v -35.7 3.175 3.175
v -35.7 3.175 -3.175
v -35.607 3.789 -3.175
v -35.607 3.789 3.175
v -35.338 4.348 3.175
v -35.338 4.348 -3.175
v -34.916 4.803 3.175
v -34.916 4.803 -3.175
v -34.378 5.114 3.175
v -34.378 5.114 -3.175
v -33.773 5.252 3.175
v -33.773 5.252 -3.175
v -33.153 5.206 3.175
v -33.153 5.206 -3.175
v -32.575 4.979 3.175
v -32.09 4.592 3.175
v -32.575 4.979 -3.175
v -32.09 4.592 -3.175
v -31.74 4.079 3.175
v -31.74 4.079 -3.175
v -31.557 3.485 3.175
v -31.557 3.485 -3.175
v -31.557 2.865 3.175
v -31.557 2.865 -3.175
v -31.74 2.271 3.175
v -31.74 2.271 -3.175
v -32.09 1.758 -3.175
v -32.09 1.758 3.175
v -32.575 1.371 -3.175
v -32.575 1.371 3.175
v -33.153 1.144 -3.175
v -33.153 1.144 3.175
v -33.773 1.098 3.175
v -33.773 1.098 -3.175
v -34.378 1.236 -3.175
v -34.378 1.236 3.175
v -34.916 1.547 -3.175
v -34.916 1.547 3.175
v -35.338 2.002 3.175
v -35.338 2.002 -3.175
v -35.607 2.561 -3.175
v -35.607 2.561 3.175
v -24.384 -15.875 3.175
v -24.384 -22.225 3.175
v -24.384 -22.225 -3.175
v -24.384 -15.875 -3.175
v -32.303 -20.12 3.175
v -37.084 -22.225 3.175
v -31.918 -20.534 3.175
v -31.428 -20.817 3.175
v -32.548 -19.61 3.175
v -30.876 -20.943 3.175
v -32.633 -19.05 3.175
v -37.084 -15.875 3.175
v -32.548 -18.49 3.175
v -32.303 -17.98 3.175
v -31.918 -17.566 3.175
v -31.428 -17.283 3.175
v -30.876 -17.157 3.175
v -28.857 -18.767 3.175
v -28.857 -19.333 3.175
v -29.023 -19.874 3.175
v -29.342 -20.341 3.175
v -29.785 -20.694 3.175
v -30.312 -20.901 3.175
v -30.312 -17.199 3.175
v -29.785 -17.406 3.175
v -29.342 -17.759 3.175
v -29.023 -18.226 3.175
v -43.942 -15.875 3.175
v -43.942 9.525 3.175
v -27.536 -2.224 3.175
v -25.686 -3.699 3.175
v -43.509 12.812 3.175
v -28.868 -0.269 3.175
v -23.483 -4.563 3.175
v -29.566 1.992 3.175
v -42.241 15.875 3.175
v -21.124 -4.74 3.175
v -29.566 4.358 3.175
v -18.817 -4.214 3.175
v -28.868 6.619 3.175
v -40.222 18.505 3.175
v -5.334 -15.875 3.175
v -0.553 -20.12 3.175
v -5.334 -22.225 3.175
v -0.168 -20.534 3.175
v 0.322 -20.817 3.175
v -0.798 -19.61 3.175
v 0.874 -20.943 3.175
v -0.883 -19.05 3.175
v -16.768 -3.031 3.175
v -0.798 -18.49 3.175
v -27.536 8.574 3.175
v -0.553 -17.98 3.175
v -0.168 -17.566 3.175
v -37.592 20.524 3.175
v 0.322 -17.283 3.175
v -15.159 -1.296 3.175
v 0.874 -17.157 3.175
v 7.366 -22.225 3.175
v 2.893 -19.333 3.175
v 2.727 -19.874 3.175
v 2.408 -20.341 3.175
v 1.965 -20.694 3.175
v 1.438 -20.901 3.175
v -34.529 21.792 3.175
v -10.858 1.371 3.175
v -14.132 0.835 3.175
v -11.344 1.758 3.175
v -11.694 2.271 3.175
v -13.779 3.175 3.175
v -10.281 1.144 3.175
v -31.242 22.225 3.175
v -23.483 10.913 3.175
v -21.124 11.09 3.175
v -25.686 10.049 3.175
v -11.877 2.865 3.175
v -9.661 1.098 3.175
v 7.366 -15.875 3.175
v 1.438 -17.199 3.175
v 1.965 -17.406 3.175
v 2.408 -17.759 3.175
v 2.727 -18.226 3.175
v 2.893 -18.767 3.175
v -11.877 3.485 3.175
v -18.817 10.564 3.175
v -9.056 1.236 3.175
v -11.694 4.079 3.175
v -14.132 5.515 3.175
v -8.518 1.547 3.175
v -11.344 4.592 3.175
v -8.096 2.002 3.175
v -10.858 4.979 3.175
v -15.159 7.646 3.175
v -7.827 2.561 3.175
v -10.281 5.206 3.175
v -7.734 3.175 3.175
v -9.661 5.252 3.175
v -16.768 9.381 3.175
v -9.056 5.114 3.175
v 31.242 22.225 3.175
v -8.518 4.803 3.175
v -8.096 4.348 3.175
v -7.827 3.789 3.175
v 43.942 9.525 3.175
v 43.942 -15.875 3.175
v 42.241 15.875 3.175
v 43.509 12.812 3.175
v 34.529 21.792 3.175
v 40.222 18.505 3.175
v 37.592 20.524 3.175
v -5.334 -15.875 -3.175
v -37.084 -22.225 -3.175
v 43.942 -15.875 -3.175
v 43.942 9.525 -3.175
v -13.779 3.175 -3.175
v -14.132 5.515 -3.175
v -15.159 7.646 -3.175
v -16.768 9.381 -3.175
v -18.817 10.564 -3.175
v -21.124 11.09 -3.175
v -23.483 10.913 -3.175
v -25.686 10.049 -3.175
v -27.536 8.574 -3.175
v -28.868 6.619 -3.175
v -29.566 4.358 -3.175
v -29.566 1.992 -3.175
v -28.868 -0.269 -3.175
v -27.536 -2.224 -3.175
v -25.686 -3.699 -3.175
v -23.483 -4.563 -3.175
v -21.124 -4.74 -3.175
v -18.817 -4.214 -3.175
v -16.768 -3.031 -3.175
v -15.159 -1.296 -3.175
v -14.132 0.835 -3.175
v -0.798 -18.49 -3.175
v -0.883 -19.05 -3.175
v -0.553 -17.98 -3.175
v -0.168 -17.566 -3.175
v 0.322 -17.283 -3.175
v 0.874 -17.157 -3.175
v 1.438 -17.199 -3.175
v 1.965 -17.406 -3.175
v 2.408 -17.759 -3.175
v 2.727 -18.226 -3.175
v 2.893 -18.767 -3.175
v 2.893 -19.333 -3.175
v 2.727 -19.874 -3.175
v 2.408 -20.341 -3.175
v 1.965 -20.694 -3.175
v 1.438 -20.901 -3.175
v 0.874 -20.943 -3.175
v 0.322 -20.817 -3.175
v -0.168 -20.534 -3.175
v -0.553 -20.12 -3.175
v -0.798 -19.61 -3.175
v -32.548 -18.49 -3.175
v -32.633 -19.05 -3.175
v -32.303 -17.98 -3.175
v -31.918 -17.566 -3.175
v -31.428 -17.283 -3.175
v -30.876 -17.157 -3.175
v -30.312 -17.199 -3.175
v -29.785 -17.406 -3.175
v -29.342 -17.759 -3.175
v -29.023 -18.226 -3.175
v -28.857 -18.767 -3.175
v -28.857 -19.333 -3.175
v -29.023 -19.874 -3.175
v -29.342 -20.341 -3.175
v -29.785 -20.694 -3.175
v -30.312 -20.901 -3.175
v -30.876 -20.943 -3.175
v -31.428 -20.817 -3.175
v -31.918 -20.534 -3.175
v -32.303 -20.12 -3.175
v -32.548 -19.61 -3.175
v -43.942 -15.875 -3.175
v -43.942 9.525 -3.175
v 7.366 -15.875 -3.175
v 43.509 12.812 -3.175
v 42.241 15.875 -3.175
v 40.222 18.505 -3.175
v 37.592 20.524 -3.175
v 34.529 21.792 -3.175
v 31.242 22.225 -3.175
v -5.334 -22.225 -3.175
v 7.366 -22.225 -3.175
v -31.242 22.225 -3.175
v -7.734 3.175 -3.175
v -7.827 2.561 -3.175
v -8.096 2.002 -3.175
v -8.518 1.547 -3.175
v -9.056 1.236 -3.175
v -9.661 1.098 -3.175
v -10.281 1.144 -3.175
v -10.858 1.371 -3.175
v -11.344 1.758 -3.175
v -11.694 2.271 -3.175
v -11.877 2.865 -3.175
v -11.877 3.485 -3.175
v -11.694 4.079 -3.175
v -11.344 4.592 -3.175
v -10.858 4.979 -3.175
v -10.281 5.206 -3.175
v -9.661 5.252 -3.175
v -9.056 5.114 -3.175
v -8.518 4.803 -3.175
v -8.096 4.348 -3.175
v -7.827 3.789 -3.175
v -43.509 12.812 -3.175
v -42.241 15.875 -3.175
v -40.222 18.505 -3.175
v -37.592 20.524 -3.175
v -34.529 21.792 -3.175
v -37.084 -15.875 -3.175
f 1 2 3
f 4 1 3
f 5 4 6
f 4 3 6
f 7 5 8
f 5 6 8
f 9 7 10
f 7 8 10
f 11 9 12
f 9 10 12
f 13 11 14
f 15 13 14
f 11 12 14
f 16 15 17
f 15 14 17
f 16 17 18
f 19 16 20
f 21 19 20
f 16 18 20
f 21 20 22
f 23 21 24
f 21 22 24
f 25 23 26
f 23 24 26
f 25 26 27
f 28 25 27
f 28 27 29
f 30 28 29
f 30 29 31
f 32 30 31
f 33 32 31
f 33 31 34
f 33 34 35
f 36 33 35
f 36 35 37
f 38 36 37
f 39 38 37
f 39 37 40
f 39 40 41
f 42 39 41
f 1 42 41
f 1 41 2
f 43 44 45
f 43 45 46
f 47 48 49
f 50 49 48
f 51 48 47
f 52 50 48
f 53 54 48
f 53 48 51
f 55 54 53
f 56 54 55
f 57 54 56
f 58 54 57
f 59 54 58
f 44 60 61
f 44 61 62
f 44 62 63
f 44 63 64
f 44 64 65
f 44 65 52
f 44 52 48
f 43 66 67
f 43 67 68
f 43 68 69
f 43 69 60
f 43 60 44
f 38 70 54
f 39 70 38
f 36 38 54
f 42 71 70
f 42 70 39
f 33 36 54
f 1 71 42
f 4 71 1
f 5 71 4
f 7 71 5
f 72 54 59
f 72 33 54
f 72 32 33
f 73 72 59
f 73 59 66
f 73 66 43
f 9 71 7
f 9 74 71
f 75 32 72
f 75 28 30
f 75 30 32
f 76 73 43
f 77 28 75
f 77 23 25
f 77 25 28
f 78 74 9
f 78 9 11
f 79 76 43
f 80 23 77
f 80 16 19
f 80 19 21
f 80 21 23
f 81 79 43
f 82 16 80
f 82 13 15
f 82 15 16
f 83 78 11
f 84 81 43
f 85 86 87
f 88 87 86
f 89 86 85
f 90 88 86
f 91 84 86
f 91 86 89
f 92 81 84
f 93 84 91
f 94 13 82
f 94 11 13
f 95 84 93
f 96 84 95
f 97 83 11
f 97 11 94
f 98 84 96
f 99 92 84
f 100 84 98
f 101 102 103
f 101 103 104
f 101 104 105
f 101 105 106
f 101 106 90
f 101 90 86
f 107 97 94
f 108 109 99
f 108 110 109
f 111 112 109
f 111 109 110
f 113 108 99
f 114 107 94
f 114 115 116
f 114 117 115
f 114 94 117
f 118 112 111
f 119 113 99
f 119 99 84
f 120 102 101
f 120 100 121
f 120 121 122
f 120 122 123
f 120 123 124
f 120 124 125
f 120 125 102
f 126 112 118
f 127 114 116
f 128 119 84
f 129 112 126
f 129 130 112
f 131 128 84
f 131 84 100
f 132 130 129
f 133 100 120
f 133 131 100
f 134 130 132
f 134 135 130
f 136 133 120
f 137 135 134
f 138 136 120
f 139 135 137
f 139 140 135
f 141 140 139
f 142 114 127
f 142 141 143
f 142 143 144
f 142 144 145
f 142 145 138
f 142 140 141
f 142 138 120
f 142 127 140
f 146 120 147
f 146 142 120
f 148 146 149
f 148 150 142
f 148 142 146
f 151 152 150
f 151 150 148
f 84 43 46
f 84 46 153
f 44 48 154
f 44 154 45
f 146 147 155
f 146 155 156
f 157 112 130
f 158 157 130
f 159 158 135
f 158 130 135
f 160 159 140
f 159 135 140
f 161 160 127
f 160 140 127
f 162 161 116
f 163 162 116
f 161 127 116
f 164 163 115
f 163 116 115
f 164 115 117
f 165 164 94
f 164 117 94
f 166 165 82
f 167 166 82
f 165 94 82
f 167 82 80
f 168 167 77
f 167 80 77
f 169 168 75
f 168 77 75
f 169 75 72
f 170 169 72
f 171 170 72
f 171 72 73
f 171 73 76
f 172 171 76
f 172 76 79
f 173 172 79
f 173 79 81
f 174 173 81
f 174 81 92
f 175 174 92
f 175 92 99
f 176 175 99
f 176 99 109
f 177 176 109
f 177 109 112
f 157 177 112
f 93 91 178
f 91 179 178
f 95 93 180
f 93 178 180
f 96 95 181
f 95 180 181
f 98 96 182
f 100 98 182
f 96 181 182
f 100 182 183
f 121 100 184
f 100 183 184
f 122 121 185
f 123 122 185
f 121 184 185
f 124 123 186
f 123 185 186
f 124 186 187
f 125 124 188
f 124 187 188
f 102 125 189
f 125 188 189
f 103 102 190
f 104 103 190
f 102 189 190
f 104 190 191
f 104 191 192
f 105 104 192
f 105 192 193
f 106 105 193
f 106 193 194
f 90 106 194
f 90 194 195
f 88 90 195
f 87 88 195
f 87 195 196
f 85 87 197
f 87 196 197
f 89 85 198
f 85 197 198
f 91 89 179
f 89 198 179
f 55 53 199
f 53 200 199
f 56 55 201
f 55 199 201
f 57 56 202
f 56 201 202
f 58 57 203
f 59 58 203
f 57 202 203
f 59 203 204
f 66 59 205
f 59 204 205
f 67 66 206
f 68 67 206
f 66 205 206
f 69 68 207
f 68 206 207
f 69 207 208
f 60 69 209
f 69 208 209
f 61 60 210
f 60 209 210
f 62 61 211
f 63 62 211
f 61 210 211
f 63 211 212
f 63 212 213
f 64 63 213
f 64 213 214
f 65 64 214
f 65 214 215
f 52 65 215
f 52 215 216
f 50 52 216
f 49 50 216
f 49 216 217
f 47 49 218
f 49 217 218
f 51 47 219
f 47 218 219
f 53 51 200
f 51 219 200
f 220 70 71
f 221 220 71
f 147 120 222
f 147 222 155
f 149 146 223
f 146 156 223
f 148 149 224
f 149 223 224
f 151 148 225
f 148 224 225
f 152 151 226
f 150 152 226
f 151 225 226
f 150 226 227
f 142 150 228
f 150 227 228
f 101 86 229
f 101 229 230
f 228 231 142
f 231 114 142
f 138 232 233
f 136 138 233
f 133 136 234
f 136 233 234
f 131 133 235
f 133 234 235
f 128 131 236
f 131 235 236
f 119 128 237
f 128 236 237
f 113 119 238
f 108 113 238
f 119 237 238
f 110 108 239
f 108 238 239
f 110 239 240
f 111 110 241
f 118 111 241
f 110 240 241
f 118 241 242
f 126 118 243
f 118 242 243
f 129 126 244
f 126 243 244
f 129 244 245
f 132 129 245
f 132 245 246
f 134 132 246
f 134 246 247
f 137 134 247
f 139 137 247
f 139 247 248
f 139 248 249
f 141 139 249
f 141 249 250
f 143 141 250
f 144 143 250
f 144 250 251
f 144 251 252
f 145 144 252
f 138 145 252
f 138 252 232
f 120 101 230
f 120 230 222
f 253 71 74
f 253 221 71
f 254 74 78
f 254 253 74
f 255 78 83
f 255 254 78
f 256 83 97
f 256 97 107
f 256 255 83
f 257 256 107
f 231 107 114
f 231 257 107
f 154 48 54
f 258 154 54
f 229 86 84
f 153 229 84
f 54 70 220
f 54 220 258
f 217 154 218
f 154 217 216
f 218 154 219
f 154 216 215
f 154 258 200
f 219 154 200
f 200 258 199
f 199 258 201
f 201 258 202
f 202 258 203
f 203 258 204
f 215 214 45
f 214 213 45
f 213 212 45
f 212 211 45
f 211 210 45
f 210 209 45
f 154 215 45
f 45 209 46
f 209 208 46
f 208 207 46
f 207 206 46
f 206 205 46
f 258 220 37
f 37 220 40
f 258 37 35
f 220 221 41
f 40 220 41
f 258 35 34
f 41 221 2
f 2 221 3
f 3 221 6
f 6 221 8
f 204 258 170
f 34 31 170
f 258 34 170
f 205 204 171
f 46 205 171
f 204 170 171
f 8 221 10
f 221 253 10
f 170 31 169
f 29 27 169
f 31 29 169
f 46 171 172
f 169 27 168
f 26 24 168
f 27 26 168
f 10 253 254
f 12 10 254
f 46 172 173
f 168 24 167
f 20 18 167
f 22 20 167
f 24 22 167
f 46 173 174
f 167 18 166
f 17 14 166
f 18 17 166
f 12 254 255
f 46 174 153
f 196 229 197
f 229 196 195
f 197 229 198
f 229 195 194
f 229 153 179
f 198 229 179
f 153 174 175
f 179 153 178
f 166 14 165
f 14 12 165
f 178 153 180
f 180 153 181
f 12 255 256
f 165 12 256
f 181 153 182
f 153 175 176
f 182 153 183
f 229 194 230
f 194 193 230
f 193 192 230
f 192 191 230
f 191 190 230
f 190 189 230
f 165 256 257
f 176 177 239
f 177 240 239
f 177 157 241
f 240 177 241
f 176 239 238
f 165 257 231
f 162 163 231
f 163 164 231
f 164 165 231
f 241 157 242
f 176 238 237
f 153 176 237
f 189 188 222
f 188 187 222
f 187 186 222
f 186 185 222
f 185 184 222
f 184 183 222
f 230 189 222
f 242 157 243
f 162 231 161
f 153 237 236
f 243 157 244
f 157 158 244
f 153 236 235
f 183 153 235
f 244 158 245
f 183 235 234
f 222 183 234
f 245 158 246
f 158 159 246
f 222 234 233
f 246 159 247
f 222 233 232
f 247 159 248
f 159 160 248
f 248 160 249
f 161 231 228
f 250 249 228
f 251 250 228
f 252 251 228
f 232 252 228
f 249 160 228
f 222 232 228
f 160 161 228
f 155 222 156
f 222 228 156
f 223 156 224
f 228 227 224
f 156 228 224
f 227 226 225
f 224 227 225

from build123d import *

# Parameters (mm, degrees)
SKETCH2_W                 = 87.884
SKETCH2_H                 = 44.45
BOSS_EXTRUDE1_DEPTH       = 3.175
CUT_EXTRUDE1_REACH        = 51.651
SKETCH3_R                 = 7.9375
F_8_CLEARANCE_HOLE1_D     = 4.1656
CIRPATTERN1_COUNT         = 2
CUT_EXTRUDE2_REACH        = 51.651
SKETCH6_W                 = 6.858
SKETCH6_H                 = 6.35
SKETCH6_W_2               = 19.05
SKETCH6_W_3               = 36.576
F_6_CLEARANCE_HOLE1_D     = 3.7973
F_6_CLEARANCE_HOLE1_DEPTH = 6.35
F_6_CLEARANCE_HOLE1_TIP   = 1.140824014
FILLET1_R                 = 12.7


with BuildPart() as part:
    # Sketch2 → Boss-Extrude1 (new, symmetric)
    with BuildSketch(Plane.XY):
        Rectangle(SKETCH2_W, SKETCH2_H)
    extrude(amount=BOSS_EXTRUDE1_DEPTH, both=True)

    # Sketch3 → Cut-Extrude1 (cut, up to next)
    with BuildSketch(Plane.XY.offset(3.175), mode=Mode.PRIVATE) as cut_extrude1_sk1:
        with Locations((-21.717, 3.175)):
            Circle(SKETCH3_R)
    cut_extrude1_tool1 = extrude(cut_extrude1_sk1.sketch, amount=-CUT_EXTRUDE1_REACH, mode=Mode.PRIVATE) & part.part
    add(cut_extrude1_tool1.solids().sort_by_distance((-21.717, 3.175, 3.175))[0], mode=Mode.SUBTRACT)

    # #8 Clearance Hole1 (through all)
    with Locations(Plane.XY.offset(3.175)):
        with Locations((-33.6169, 3.175)):
            f_8_clearance_hole1 = Hole(F_8_CLEARANCE_HOLE1_D / 2)

    # CirPattern1: #8 Clearance Hole1 ×2 about axis
    cirpattern1_axis = Axis((-21.717, 3.175, 0), (0, 0, 1))
    for i in range(1, CIRPATTERN1_COUNT):
        add(f_8_clearance_hole1.rotate(cirpattern1_axis, i * 360 / CIRPATTERN1_COUNT), mode=Mode.SUBTRACT)

    # Sketch6 → Cut-Extrude2 (cut, up to next)
    with BuildSketch(Plane.XY.offset(3.175), mode=Mode.PRIVATE) as cut_extrude2_sk1:
        with Locations((-40.513, -19.05)):
            Rectangle(SKETCH6_W, SKETCH6_H)
    cut_extrude2_tool1 = extrude(cut_extrude2_sk1.sketch, amount=-CUT_EXTRUDE2_REACH, mode=Mode.PRIVATE) & part.part
    # Sketch6 → Cut-Extrude2 (cut, up to next)
    with BuildSketch(Plane.XY.offset(3.175), mode=Mode.PRIVATE) as cut_extrude2_sk2:
        with Locations((-14.859, -19.05)):
            Rectangle(SKETCH6_W_2, SKETCH6_H)
    cut_extrude2_tool2 = extrude(cut_extrude2_sk2.sketch, amount=-CUT_EXTRUDE2_REACH, mode=Mode.PRIVATE) & part.part
    # Sketch6 → Cut-Extrude2 (cut, up to next)
    with BuildSketch(Plane.XY.offset(3.175), mode=Mode.PRIVATE) as cut_extrude2_sk3:
        with Locations((25.654, -19.05)):
            Rectangle(SKETCH6_W_3, SKETCH6_H)
    cut_extrude2_tool3 = extrude(cut_extrude2_sk3.sketch, amount=-CUT_EXTRUDE2_REACH, mode=Mode.PRIVATE) & part.part
    add(cut_extrude2_tool1.solids().sort_by_distance((-40.513, -19.05, 3.175))[0], mode=Mode.SUBTRACT)
    add(cut_extrude2_tool2.solids().sort_by_distance((-14.859, -19.05, 3.175))[0], mode=Mode.SUBTRACT)
    add(cut_extrude2_tool3.solids().sort_by_distance((25.654, -19.05, 3.175))[0], mode=Mode.SUBTRACT)

    # #6 Clearance Hole1
    with Locations(Plane.XY.offset(3.175)):
        with Locations((1.016, -19.05), (-30.734, -19.05)):
            Hole(F_6_CLEARANCE_HOLE1_D / 2, depth=F_6_CLEARANCE_HOLE1_DEPTH)
            with Locations((0, 0, -(F_6_CLEARANCE_HOLE1_DEPTH + F_6_CLEARANCE_HOLE1_TIP / 2))):  # 118° drill point
                Cone(0, F_6_CLEARANCE_HOLE1_D / 2, F_6_CLEARANCE_HOLE1_TIP, mode=Mode.SUBTRACT)

    # Fillet1
    fillet1_edges = [part.edges().sort_by_distance(p)[0] for p in [
        (-43.942, 22.225, 0),
        (43.942, 22.225, 0),
    ]]
    fillet(fillet1_edges, radius=FILLET1_R)


solid = part.part
